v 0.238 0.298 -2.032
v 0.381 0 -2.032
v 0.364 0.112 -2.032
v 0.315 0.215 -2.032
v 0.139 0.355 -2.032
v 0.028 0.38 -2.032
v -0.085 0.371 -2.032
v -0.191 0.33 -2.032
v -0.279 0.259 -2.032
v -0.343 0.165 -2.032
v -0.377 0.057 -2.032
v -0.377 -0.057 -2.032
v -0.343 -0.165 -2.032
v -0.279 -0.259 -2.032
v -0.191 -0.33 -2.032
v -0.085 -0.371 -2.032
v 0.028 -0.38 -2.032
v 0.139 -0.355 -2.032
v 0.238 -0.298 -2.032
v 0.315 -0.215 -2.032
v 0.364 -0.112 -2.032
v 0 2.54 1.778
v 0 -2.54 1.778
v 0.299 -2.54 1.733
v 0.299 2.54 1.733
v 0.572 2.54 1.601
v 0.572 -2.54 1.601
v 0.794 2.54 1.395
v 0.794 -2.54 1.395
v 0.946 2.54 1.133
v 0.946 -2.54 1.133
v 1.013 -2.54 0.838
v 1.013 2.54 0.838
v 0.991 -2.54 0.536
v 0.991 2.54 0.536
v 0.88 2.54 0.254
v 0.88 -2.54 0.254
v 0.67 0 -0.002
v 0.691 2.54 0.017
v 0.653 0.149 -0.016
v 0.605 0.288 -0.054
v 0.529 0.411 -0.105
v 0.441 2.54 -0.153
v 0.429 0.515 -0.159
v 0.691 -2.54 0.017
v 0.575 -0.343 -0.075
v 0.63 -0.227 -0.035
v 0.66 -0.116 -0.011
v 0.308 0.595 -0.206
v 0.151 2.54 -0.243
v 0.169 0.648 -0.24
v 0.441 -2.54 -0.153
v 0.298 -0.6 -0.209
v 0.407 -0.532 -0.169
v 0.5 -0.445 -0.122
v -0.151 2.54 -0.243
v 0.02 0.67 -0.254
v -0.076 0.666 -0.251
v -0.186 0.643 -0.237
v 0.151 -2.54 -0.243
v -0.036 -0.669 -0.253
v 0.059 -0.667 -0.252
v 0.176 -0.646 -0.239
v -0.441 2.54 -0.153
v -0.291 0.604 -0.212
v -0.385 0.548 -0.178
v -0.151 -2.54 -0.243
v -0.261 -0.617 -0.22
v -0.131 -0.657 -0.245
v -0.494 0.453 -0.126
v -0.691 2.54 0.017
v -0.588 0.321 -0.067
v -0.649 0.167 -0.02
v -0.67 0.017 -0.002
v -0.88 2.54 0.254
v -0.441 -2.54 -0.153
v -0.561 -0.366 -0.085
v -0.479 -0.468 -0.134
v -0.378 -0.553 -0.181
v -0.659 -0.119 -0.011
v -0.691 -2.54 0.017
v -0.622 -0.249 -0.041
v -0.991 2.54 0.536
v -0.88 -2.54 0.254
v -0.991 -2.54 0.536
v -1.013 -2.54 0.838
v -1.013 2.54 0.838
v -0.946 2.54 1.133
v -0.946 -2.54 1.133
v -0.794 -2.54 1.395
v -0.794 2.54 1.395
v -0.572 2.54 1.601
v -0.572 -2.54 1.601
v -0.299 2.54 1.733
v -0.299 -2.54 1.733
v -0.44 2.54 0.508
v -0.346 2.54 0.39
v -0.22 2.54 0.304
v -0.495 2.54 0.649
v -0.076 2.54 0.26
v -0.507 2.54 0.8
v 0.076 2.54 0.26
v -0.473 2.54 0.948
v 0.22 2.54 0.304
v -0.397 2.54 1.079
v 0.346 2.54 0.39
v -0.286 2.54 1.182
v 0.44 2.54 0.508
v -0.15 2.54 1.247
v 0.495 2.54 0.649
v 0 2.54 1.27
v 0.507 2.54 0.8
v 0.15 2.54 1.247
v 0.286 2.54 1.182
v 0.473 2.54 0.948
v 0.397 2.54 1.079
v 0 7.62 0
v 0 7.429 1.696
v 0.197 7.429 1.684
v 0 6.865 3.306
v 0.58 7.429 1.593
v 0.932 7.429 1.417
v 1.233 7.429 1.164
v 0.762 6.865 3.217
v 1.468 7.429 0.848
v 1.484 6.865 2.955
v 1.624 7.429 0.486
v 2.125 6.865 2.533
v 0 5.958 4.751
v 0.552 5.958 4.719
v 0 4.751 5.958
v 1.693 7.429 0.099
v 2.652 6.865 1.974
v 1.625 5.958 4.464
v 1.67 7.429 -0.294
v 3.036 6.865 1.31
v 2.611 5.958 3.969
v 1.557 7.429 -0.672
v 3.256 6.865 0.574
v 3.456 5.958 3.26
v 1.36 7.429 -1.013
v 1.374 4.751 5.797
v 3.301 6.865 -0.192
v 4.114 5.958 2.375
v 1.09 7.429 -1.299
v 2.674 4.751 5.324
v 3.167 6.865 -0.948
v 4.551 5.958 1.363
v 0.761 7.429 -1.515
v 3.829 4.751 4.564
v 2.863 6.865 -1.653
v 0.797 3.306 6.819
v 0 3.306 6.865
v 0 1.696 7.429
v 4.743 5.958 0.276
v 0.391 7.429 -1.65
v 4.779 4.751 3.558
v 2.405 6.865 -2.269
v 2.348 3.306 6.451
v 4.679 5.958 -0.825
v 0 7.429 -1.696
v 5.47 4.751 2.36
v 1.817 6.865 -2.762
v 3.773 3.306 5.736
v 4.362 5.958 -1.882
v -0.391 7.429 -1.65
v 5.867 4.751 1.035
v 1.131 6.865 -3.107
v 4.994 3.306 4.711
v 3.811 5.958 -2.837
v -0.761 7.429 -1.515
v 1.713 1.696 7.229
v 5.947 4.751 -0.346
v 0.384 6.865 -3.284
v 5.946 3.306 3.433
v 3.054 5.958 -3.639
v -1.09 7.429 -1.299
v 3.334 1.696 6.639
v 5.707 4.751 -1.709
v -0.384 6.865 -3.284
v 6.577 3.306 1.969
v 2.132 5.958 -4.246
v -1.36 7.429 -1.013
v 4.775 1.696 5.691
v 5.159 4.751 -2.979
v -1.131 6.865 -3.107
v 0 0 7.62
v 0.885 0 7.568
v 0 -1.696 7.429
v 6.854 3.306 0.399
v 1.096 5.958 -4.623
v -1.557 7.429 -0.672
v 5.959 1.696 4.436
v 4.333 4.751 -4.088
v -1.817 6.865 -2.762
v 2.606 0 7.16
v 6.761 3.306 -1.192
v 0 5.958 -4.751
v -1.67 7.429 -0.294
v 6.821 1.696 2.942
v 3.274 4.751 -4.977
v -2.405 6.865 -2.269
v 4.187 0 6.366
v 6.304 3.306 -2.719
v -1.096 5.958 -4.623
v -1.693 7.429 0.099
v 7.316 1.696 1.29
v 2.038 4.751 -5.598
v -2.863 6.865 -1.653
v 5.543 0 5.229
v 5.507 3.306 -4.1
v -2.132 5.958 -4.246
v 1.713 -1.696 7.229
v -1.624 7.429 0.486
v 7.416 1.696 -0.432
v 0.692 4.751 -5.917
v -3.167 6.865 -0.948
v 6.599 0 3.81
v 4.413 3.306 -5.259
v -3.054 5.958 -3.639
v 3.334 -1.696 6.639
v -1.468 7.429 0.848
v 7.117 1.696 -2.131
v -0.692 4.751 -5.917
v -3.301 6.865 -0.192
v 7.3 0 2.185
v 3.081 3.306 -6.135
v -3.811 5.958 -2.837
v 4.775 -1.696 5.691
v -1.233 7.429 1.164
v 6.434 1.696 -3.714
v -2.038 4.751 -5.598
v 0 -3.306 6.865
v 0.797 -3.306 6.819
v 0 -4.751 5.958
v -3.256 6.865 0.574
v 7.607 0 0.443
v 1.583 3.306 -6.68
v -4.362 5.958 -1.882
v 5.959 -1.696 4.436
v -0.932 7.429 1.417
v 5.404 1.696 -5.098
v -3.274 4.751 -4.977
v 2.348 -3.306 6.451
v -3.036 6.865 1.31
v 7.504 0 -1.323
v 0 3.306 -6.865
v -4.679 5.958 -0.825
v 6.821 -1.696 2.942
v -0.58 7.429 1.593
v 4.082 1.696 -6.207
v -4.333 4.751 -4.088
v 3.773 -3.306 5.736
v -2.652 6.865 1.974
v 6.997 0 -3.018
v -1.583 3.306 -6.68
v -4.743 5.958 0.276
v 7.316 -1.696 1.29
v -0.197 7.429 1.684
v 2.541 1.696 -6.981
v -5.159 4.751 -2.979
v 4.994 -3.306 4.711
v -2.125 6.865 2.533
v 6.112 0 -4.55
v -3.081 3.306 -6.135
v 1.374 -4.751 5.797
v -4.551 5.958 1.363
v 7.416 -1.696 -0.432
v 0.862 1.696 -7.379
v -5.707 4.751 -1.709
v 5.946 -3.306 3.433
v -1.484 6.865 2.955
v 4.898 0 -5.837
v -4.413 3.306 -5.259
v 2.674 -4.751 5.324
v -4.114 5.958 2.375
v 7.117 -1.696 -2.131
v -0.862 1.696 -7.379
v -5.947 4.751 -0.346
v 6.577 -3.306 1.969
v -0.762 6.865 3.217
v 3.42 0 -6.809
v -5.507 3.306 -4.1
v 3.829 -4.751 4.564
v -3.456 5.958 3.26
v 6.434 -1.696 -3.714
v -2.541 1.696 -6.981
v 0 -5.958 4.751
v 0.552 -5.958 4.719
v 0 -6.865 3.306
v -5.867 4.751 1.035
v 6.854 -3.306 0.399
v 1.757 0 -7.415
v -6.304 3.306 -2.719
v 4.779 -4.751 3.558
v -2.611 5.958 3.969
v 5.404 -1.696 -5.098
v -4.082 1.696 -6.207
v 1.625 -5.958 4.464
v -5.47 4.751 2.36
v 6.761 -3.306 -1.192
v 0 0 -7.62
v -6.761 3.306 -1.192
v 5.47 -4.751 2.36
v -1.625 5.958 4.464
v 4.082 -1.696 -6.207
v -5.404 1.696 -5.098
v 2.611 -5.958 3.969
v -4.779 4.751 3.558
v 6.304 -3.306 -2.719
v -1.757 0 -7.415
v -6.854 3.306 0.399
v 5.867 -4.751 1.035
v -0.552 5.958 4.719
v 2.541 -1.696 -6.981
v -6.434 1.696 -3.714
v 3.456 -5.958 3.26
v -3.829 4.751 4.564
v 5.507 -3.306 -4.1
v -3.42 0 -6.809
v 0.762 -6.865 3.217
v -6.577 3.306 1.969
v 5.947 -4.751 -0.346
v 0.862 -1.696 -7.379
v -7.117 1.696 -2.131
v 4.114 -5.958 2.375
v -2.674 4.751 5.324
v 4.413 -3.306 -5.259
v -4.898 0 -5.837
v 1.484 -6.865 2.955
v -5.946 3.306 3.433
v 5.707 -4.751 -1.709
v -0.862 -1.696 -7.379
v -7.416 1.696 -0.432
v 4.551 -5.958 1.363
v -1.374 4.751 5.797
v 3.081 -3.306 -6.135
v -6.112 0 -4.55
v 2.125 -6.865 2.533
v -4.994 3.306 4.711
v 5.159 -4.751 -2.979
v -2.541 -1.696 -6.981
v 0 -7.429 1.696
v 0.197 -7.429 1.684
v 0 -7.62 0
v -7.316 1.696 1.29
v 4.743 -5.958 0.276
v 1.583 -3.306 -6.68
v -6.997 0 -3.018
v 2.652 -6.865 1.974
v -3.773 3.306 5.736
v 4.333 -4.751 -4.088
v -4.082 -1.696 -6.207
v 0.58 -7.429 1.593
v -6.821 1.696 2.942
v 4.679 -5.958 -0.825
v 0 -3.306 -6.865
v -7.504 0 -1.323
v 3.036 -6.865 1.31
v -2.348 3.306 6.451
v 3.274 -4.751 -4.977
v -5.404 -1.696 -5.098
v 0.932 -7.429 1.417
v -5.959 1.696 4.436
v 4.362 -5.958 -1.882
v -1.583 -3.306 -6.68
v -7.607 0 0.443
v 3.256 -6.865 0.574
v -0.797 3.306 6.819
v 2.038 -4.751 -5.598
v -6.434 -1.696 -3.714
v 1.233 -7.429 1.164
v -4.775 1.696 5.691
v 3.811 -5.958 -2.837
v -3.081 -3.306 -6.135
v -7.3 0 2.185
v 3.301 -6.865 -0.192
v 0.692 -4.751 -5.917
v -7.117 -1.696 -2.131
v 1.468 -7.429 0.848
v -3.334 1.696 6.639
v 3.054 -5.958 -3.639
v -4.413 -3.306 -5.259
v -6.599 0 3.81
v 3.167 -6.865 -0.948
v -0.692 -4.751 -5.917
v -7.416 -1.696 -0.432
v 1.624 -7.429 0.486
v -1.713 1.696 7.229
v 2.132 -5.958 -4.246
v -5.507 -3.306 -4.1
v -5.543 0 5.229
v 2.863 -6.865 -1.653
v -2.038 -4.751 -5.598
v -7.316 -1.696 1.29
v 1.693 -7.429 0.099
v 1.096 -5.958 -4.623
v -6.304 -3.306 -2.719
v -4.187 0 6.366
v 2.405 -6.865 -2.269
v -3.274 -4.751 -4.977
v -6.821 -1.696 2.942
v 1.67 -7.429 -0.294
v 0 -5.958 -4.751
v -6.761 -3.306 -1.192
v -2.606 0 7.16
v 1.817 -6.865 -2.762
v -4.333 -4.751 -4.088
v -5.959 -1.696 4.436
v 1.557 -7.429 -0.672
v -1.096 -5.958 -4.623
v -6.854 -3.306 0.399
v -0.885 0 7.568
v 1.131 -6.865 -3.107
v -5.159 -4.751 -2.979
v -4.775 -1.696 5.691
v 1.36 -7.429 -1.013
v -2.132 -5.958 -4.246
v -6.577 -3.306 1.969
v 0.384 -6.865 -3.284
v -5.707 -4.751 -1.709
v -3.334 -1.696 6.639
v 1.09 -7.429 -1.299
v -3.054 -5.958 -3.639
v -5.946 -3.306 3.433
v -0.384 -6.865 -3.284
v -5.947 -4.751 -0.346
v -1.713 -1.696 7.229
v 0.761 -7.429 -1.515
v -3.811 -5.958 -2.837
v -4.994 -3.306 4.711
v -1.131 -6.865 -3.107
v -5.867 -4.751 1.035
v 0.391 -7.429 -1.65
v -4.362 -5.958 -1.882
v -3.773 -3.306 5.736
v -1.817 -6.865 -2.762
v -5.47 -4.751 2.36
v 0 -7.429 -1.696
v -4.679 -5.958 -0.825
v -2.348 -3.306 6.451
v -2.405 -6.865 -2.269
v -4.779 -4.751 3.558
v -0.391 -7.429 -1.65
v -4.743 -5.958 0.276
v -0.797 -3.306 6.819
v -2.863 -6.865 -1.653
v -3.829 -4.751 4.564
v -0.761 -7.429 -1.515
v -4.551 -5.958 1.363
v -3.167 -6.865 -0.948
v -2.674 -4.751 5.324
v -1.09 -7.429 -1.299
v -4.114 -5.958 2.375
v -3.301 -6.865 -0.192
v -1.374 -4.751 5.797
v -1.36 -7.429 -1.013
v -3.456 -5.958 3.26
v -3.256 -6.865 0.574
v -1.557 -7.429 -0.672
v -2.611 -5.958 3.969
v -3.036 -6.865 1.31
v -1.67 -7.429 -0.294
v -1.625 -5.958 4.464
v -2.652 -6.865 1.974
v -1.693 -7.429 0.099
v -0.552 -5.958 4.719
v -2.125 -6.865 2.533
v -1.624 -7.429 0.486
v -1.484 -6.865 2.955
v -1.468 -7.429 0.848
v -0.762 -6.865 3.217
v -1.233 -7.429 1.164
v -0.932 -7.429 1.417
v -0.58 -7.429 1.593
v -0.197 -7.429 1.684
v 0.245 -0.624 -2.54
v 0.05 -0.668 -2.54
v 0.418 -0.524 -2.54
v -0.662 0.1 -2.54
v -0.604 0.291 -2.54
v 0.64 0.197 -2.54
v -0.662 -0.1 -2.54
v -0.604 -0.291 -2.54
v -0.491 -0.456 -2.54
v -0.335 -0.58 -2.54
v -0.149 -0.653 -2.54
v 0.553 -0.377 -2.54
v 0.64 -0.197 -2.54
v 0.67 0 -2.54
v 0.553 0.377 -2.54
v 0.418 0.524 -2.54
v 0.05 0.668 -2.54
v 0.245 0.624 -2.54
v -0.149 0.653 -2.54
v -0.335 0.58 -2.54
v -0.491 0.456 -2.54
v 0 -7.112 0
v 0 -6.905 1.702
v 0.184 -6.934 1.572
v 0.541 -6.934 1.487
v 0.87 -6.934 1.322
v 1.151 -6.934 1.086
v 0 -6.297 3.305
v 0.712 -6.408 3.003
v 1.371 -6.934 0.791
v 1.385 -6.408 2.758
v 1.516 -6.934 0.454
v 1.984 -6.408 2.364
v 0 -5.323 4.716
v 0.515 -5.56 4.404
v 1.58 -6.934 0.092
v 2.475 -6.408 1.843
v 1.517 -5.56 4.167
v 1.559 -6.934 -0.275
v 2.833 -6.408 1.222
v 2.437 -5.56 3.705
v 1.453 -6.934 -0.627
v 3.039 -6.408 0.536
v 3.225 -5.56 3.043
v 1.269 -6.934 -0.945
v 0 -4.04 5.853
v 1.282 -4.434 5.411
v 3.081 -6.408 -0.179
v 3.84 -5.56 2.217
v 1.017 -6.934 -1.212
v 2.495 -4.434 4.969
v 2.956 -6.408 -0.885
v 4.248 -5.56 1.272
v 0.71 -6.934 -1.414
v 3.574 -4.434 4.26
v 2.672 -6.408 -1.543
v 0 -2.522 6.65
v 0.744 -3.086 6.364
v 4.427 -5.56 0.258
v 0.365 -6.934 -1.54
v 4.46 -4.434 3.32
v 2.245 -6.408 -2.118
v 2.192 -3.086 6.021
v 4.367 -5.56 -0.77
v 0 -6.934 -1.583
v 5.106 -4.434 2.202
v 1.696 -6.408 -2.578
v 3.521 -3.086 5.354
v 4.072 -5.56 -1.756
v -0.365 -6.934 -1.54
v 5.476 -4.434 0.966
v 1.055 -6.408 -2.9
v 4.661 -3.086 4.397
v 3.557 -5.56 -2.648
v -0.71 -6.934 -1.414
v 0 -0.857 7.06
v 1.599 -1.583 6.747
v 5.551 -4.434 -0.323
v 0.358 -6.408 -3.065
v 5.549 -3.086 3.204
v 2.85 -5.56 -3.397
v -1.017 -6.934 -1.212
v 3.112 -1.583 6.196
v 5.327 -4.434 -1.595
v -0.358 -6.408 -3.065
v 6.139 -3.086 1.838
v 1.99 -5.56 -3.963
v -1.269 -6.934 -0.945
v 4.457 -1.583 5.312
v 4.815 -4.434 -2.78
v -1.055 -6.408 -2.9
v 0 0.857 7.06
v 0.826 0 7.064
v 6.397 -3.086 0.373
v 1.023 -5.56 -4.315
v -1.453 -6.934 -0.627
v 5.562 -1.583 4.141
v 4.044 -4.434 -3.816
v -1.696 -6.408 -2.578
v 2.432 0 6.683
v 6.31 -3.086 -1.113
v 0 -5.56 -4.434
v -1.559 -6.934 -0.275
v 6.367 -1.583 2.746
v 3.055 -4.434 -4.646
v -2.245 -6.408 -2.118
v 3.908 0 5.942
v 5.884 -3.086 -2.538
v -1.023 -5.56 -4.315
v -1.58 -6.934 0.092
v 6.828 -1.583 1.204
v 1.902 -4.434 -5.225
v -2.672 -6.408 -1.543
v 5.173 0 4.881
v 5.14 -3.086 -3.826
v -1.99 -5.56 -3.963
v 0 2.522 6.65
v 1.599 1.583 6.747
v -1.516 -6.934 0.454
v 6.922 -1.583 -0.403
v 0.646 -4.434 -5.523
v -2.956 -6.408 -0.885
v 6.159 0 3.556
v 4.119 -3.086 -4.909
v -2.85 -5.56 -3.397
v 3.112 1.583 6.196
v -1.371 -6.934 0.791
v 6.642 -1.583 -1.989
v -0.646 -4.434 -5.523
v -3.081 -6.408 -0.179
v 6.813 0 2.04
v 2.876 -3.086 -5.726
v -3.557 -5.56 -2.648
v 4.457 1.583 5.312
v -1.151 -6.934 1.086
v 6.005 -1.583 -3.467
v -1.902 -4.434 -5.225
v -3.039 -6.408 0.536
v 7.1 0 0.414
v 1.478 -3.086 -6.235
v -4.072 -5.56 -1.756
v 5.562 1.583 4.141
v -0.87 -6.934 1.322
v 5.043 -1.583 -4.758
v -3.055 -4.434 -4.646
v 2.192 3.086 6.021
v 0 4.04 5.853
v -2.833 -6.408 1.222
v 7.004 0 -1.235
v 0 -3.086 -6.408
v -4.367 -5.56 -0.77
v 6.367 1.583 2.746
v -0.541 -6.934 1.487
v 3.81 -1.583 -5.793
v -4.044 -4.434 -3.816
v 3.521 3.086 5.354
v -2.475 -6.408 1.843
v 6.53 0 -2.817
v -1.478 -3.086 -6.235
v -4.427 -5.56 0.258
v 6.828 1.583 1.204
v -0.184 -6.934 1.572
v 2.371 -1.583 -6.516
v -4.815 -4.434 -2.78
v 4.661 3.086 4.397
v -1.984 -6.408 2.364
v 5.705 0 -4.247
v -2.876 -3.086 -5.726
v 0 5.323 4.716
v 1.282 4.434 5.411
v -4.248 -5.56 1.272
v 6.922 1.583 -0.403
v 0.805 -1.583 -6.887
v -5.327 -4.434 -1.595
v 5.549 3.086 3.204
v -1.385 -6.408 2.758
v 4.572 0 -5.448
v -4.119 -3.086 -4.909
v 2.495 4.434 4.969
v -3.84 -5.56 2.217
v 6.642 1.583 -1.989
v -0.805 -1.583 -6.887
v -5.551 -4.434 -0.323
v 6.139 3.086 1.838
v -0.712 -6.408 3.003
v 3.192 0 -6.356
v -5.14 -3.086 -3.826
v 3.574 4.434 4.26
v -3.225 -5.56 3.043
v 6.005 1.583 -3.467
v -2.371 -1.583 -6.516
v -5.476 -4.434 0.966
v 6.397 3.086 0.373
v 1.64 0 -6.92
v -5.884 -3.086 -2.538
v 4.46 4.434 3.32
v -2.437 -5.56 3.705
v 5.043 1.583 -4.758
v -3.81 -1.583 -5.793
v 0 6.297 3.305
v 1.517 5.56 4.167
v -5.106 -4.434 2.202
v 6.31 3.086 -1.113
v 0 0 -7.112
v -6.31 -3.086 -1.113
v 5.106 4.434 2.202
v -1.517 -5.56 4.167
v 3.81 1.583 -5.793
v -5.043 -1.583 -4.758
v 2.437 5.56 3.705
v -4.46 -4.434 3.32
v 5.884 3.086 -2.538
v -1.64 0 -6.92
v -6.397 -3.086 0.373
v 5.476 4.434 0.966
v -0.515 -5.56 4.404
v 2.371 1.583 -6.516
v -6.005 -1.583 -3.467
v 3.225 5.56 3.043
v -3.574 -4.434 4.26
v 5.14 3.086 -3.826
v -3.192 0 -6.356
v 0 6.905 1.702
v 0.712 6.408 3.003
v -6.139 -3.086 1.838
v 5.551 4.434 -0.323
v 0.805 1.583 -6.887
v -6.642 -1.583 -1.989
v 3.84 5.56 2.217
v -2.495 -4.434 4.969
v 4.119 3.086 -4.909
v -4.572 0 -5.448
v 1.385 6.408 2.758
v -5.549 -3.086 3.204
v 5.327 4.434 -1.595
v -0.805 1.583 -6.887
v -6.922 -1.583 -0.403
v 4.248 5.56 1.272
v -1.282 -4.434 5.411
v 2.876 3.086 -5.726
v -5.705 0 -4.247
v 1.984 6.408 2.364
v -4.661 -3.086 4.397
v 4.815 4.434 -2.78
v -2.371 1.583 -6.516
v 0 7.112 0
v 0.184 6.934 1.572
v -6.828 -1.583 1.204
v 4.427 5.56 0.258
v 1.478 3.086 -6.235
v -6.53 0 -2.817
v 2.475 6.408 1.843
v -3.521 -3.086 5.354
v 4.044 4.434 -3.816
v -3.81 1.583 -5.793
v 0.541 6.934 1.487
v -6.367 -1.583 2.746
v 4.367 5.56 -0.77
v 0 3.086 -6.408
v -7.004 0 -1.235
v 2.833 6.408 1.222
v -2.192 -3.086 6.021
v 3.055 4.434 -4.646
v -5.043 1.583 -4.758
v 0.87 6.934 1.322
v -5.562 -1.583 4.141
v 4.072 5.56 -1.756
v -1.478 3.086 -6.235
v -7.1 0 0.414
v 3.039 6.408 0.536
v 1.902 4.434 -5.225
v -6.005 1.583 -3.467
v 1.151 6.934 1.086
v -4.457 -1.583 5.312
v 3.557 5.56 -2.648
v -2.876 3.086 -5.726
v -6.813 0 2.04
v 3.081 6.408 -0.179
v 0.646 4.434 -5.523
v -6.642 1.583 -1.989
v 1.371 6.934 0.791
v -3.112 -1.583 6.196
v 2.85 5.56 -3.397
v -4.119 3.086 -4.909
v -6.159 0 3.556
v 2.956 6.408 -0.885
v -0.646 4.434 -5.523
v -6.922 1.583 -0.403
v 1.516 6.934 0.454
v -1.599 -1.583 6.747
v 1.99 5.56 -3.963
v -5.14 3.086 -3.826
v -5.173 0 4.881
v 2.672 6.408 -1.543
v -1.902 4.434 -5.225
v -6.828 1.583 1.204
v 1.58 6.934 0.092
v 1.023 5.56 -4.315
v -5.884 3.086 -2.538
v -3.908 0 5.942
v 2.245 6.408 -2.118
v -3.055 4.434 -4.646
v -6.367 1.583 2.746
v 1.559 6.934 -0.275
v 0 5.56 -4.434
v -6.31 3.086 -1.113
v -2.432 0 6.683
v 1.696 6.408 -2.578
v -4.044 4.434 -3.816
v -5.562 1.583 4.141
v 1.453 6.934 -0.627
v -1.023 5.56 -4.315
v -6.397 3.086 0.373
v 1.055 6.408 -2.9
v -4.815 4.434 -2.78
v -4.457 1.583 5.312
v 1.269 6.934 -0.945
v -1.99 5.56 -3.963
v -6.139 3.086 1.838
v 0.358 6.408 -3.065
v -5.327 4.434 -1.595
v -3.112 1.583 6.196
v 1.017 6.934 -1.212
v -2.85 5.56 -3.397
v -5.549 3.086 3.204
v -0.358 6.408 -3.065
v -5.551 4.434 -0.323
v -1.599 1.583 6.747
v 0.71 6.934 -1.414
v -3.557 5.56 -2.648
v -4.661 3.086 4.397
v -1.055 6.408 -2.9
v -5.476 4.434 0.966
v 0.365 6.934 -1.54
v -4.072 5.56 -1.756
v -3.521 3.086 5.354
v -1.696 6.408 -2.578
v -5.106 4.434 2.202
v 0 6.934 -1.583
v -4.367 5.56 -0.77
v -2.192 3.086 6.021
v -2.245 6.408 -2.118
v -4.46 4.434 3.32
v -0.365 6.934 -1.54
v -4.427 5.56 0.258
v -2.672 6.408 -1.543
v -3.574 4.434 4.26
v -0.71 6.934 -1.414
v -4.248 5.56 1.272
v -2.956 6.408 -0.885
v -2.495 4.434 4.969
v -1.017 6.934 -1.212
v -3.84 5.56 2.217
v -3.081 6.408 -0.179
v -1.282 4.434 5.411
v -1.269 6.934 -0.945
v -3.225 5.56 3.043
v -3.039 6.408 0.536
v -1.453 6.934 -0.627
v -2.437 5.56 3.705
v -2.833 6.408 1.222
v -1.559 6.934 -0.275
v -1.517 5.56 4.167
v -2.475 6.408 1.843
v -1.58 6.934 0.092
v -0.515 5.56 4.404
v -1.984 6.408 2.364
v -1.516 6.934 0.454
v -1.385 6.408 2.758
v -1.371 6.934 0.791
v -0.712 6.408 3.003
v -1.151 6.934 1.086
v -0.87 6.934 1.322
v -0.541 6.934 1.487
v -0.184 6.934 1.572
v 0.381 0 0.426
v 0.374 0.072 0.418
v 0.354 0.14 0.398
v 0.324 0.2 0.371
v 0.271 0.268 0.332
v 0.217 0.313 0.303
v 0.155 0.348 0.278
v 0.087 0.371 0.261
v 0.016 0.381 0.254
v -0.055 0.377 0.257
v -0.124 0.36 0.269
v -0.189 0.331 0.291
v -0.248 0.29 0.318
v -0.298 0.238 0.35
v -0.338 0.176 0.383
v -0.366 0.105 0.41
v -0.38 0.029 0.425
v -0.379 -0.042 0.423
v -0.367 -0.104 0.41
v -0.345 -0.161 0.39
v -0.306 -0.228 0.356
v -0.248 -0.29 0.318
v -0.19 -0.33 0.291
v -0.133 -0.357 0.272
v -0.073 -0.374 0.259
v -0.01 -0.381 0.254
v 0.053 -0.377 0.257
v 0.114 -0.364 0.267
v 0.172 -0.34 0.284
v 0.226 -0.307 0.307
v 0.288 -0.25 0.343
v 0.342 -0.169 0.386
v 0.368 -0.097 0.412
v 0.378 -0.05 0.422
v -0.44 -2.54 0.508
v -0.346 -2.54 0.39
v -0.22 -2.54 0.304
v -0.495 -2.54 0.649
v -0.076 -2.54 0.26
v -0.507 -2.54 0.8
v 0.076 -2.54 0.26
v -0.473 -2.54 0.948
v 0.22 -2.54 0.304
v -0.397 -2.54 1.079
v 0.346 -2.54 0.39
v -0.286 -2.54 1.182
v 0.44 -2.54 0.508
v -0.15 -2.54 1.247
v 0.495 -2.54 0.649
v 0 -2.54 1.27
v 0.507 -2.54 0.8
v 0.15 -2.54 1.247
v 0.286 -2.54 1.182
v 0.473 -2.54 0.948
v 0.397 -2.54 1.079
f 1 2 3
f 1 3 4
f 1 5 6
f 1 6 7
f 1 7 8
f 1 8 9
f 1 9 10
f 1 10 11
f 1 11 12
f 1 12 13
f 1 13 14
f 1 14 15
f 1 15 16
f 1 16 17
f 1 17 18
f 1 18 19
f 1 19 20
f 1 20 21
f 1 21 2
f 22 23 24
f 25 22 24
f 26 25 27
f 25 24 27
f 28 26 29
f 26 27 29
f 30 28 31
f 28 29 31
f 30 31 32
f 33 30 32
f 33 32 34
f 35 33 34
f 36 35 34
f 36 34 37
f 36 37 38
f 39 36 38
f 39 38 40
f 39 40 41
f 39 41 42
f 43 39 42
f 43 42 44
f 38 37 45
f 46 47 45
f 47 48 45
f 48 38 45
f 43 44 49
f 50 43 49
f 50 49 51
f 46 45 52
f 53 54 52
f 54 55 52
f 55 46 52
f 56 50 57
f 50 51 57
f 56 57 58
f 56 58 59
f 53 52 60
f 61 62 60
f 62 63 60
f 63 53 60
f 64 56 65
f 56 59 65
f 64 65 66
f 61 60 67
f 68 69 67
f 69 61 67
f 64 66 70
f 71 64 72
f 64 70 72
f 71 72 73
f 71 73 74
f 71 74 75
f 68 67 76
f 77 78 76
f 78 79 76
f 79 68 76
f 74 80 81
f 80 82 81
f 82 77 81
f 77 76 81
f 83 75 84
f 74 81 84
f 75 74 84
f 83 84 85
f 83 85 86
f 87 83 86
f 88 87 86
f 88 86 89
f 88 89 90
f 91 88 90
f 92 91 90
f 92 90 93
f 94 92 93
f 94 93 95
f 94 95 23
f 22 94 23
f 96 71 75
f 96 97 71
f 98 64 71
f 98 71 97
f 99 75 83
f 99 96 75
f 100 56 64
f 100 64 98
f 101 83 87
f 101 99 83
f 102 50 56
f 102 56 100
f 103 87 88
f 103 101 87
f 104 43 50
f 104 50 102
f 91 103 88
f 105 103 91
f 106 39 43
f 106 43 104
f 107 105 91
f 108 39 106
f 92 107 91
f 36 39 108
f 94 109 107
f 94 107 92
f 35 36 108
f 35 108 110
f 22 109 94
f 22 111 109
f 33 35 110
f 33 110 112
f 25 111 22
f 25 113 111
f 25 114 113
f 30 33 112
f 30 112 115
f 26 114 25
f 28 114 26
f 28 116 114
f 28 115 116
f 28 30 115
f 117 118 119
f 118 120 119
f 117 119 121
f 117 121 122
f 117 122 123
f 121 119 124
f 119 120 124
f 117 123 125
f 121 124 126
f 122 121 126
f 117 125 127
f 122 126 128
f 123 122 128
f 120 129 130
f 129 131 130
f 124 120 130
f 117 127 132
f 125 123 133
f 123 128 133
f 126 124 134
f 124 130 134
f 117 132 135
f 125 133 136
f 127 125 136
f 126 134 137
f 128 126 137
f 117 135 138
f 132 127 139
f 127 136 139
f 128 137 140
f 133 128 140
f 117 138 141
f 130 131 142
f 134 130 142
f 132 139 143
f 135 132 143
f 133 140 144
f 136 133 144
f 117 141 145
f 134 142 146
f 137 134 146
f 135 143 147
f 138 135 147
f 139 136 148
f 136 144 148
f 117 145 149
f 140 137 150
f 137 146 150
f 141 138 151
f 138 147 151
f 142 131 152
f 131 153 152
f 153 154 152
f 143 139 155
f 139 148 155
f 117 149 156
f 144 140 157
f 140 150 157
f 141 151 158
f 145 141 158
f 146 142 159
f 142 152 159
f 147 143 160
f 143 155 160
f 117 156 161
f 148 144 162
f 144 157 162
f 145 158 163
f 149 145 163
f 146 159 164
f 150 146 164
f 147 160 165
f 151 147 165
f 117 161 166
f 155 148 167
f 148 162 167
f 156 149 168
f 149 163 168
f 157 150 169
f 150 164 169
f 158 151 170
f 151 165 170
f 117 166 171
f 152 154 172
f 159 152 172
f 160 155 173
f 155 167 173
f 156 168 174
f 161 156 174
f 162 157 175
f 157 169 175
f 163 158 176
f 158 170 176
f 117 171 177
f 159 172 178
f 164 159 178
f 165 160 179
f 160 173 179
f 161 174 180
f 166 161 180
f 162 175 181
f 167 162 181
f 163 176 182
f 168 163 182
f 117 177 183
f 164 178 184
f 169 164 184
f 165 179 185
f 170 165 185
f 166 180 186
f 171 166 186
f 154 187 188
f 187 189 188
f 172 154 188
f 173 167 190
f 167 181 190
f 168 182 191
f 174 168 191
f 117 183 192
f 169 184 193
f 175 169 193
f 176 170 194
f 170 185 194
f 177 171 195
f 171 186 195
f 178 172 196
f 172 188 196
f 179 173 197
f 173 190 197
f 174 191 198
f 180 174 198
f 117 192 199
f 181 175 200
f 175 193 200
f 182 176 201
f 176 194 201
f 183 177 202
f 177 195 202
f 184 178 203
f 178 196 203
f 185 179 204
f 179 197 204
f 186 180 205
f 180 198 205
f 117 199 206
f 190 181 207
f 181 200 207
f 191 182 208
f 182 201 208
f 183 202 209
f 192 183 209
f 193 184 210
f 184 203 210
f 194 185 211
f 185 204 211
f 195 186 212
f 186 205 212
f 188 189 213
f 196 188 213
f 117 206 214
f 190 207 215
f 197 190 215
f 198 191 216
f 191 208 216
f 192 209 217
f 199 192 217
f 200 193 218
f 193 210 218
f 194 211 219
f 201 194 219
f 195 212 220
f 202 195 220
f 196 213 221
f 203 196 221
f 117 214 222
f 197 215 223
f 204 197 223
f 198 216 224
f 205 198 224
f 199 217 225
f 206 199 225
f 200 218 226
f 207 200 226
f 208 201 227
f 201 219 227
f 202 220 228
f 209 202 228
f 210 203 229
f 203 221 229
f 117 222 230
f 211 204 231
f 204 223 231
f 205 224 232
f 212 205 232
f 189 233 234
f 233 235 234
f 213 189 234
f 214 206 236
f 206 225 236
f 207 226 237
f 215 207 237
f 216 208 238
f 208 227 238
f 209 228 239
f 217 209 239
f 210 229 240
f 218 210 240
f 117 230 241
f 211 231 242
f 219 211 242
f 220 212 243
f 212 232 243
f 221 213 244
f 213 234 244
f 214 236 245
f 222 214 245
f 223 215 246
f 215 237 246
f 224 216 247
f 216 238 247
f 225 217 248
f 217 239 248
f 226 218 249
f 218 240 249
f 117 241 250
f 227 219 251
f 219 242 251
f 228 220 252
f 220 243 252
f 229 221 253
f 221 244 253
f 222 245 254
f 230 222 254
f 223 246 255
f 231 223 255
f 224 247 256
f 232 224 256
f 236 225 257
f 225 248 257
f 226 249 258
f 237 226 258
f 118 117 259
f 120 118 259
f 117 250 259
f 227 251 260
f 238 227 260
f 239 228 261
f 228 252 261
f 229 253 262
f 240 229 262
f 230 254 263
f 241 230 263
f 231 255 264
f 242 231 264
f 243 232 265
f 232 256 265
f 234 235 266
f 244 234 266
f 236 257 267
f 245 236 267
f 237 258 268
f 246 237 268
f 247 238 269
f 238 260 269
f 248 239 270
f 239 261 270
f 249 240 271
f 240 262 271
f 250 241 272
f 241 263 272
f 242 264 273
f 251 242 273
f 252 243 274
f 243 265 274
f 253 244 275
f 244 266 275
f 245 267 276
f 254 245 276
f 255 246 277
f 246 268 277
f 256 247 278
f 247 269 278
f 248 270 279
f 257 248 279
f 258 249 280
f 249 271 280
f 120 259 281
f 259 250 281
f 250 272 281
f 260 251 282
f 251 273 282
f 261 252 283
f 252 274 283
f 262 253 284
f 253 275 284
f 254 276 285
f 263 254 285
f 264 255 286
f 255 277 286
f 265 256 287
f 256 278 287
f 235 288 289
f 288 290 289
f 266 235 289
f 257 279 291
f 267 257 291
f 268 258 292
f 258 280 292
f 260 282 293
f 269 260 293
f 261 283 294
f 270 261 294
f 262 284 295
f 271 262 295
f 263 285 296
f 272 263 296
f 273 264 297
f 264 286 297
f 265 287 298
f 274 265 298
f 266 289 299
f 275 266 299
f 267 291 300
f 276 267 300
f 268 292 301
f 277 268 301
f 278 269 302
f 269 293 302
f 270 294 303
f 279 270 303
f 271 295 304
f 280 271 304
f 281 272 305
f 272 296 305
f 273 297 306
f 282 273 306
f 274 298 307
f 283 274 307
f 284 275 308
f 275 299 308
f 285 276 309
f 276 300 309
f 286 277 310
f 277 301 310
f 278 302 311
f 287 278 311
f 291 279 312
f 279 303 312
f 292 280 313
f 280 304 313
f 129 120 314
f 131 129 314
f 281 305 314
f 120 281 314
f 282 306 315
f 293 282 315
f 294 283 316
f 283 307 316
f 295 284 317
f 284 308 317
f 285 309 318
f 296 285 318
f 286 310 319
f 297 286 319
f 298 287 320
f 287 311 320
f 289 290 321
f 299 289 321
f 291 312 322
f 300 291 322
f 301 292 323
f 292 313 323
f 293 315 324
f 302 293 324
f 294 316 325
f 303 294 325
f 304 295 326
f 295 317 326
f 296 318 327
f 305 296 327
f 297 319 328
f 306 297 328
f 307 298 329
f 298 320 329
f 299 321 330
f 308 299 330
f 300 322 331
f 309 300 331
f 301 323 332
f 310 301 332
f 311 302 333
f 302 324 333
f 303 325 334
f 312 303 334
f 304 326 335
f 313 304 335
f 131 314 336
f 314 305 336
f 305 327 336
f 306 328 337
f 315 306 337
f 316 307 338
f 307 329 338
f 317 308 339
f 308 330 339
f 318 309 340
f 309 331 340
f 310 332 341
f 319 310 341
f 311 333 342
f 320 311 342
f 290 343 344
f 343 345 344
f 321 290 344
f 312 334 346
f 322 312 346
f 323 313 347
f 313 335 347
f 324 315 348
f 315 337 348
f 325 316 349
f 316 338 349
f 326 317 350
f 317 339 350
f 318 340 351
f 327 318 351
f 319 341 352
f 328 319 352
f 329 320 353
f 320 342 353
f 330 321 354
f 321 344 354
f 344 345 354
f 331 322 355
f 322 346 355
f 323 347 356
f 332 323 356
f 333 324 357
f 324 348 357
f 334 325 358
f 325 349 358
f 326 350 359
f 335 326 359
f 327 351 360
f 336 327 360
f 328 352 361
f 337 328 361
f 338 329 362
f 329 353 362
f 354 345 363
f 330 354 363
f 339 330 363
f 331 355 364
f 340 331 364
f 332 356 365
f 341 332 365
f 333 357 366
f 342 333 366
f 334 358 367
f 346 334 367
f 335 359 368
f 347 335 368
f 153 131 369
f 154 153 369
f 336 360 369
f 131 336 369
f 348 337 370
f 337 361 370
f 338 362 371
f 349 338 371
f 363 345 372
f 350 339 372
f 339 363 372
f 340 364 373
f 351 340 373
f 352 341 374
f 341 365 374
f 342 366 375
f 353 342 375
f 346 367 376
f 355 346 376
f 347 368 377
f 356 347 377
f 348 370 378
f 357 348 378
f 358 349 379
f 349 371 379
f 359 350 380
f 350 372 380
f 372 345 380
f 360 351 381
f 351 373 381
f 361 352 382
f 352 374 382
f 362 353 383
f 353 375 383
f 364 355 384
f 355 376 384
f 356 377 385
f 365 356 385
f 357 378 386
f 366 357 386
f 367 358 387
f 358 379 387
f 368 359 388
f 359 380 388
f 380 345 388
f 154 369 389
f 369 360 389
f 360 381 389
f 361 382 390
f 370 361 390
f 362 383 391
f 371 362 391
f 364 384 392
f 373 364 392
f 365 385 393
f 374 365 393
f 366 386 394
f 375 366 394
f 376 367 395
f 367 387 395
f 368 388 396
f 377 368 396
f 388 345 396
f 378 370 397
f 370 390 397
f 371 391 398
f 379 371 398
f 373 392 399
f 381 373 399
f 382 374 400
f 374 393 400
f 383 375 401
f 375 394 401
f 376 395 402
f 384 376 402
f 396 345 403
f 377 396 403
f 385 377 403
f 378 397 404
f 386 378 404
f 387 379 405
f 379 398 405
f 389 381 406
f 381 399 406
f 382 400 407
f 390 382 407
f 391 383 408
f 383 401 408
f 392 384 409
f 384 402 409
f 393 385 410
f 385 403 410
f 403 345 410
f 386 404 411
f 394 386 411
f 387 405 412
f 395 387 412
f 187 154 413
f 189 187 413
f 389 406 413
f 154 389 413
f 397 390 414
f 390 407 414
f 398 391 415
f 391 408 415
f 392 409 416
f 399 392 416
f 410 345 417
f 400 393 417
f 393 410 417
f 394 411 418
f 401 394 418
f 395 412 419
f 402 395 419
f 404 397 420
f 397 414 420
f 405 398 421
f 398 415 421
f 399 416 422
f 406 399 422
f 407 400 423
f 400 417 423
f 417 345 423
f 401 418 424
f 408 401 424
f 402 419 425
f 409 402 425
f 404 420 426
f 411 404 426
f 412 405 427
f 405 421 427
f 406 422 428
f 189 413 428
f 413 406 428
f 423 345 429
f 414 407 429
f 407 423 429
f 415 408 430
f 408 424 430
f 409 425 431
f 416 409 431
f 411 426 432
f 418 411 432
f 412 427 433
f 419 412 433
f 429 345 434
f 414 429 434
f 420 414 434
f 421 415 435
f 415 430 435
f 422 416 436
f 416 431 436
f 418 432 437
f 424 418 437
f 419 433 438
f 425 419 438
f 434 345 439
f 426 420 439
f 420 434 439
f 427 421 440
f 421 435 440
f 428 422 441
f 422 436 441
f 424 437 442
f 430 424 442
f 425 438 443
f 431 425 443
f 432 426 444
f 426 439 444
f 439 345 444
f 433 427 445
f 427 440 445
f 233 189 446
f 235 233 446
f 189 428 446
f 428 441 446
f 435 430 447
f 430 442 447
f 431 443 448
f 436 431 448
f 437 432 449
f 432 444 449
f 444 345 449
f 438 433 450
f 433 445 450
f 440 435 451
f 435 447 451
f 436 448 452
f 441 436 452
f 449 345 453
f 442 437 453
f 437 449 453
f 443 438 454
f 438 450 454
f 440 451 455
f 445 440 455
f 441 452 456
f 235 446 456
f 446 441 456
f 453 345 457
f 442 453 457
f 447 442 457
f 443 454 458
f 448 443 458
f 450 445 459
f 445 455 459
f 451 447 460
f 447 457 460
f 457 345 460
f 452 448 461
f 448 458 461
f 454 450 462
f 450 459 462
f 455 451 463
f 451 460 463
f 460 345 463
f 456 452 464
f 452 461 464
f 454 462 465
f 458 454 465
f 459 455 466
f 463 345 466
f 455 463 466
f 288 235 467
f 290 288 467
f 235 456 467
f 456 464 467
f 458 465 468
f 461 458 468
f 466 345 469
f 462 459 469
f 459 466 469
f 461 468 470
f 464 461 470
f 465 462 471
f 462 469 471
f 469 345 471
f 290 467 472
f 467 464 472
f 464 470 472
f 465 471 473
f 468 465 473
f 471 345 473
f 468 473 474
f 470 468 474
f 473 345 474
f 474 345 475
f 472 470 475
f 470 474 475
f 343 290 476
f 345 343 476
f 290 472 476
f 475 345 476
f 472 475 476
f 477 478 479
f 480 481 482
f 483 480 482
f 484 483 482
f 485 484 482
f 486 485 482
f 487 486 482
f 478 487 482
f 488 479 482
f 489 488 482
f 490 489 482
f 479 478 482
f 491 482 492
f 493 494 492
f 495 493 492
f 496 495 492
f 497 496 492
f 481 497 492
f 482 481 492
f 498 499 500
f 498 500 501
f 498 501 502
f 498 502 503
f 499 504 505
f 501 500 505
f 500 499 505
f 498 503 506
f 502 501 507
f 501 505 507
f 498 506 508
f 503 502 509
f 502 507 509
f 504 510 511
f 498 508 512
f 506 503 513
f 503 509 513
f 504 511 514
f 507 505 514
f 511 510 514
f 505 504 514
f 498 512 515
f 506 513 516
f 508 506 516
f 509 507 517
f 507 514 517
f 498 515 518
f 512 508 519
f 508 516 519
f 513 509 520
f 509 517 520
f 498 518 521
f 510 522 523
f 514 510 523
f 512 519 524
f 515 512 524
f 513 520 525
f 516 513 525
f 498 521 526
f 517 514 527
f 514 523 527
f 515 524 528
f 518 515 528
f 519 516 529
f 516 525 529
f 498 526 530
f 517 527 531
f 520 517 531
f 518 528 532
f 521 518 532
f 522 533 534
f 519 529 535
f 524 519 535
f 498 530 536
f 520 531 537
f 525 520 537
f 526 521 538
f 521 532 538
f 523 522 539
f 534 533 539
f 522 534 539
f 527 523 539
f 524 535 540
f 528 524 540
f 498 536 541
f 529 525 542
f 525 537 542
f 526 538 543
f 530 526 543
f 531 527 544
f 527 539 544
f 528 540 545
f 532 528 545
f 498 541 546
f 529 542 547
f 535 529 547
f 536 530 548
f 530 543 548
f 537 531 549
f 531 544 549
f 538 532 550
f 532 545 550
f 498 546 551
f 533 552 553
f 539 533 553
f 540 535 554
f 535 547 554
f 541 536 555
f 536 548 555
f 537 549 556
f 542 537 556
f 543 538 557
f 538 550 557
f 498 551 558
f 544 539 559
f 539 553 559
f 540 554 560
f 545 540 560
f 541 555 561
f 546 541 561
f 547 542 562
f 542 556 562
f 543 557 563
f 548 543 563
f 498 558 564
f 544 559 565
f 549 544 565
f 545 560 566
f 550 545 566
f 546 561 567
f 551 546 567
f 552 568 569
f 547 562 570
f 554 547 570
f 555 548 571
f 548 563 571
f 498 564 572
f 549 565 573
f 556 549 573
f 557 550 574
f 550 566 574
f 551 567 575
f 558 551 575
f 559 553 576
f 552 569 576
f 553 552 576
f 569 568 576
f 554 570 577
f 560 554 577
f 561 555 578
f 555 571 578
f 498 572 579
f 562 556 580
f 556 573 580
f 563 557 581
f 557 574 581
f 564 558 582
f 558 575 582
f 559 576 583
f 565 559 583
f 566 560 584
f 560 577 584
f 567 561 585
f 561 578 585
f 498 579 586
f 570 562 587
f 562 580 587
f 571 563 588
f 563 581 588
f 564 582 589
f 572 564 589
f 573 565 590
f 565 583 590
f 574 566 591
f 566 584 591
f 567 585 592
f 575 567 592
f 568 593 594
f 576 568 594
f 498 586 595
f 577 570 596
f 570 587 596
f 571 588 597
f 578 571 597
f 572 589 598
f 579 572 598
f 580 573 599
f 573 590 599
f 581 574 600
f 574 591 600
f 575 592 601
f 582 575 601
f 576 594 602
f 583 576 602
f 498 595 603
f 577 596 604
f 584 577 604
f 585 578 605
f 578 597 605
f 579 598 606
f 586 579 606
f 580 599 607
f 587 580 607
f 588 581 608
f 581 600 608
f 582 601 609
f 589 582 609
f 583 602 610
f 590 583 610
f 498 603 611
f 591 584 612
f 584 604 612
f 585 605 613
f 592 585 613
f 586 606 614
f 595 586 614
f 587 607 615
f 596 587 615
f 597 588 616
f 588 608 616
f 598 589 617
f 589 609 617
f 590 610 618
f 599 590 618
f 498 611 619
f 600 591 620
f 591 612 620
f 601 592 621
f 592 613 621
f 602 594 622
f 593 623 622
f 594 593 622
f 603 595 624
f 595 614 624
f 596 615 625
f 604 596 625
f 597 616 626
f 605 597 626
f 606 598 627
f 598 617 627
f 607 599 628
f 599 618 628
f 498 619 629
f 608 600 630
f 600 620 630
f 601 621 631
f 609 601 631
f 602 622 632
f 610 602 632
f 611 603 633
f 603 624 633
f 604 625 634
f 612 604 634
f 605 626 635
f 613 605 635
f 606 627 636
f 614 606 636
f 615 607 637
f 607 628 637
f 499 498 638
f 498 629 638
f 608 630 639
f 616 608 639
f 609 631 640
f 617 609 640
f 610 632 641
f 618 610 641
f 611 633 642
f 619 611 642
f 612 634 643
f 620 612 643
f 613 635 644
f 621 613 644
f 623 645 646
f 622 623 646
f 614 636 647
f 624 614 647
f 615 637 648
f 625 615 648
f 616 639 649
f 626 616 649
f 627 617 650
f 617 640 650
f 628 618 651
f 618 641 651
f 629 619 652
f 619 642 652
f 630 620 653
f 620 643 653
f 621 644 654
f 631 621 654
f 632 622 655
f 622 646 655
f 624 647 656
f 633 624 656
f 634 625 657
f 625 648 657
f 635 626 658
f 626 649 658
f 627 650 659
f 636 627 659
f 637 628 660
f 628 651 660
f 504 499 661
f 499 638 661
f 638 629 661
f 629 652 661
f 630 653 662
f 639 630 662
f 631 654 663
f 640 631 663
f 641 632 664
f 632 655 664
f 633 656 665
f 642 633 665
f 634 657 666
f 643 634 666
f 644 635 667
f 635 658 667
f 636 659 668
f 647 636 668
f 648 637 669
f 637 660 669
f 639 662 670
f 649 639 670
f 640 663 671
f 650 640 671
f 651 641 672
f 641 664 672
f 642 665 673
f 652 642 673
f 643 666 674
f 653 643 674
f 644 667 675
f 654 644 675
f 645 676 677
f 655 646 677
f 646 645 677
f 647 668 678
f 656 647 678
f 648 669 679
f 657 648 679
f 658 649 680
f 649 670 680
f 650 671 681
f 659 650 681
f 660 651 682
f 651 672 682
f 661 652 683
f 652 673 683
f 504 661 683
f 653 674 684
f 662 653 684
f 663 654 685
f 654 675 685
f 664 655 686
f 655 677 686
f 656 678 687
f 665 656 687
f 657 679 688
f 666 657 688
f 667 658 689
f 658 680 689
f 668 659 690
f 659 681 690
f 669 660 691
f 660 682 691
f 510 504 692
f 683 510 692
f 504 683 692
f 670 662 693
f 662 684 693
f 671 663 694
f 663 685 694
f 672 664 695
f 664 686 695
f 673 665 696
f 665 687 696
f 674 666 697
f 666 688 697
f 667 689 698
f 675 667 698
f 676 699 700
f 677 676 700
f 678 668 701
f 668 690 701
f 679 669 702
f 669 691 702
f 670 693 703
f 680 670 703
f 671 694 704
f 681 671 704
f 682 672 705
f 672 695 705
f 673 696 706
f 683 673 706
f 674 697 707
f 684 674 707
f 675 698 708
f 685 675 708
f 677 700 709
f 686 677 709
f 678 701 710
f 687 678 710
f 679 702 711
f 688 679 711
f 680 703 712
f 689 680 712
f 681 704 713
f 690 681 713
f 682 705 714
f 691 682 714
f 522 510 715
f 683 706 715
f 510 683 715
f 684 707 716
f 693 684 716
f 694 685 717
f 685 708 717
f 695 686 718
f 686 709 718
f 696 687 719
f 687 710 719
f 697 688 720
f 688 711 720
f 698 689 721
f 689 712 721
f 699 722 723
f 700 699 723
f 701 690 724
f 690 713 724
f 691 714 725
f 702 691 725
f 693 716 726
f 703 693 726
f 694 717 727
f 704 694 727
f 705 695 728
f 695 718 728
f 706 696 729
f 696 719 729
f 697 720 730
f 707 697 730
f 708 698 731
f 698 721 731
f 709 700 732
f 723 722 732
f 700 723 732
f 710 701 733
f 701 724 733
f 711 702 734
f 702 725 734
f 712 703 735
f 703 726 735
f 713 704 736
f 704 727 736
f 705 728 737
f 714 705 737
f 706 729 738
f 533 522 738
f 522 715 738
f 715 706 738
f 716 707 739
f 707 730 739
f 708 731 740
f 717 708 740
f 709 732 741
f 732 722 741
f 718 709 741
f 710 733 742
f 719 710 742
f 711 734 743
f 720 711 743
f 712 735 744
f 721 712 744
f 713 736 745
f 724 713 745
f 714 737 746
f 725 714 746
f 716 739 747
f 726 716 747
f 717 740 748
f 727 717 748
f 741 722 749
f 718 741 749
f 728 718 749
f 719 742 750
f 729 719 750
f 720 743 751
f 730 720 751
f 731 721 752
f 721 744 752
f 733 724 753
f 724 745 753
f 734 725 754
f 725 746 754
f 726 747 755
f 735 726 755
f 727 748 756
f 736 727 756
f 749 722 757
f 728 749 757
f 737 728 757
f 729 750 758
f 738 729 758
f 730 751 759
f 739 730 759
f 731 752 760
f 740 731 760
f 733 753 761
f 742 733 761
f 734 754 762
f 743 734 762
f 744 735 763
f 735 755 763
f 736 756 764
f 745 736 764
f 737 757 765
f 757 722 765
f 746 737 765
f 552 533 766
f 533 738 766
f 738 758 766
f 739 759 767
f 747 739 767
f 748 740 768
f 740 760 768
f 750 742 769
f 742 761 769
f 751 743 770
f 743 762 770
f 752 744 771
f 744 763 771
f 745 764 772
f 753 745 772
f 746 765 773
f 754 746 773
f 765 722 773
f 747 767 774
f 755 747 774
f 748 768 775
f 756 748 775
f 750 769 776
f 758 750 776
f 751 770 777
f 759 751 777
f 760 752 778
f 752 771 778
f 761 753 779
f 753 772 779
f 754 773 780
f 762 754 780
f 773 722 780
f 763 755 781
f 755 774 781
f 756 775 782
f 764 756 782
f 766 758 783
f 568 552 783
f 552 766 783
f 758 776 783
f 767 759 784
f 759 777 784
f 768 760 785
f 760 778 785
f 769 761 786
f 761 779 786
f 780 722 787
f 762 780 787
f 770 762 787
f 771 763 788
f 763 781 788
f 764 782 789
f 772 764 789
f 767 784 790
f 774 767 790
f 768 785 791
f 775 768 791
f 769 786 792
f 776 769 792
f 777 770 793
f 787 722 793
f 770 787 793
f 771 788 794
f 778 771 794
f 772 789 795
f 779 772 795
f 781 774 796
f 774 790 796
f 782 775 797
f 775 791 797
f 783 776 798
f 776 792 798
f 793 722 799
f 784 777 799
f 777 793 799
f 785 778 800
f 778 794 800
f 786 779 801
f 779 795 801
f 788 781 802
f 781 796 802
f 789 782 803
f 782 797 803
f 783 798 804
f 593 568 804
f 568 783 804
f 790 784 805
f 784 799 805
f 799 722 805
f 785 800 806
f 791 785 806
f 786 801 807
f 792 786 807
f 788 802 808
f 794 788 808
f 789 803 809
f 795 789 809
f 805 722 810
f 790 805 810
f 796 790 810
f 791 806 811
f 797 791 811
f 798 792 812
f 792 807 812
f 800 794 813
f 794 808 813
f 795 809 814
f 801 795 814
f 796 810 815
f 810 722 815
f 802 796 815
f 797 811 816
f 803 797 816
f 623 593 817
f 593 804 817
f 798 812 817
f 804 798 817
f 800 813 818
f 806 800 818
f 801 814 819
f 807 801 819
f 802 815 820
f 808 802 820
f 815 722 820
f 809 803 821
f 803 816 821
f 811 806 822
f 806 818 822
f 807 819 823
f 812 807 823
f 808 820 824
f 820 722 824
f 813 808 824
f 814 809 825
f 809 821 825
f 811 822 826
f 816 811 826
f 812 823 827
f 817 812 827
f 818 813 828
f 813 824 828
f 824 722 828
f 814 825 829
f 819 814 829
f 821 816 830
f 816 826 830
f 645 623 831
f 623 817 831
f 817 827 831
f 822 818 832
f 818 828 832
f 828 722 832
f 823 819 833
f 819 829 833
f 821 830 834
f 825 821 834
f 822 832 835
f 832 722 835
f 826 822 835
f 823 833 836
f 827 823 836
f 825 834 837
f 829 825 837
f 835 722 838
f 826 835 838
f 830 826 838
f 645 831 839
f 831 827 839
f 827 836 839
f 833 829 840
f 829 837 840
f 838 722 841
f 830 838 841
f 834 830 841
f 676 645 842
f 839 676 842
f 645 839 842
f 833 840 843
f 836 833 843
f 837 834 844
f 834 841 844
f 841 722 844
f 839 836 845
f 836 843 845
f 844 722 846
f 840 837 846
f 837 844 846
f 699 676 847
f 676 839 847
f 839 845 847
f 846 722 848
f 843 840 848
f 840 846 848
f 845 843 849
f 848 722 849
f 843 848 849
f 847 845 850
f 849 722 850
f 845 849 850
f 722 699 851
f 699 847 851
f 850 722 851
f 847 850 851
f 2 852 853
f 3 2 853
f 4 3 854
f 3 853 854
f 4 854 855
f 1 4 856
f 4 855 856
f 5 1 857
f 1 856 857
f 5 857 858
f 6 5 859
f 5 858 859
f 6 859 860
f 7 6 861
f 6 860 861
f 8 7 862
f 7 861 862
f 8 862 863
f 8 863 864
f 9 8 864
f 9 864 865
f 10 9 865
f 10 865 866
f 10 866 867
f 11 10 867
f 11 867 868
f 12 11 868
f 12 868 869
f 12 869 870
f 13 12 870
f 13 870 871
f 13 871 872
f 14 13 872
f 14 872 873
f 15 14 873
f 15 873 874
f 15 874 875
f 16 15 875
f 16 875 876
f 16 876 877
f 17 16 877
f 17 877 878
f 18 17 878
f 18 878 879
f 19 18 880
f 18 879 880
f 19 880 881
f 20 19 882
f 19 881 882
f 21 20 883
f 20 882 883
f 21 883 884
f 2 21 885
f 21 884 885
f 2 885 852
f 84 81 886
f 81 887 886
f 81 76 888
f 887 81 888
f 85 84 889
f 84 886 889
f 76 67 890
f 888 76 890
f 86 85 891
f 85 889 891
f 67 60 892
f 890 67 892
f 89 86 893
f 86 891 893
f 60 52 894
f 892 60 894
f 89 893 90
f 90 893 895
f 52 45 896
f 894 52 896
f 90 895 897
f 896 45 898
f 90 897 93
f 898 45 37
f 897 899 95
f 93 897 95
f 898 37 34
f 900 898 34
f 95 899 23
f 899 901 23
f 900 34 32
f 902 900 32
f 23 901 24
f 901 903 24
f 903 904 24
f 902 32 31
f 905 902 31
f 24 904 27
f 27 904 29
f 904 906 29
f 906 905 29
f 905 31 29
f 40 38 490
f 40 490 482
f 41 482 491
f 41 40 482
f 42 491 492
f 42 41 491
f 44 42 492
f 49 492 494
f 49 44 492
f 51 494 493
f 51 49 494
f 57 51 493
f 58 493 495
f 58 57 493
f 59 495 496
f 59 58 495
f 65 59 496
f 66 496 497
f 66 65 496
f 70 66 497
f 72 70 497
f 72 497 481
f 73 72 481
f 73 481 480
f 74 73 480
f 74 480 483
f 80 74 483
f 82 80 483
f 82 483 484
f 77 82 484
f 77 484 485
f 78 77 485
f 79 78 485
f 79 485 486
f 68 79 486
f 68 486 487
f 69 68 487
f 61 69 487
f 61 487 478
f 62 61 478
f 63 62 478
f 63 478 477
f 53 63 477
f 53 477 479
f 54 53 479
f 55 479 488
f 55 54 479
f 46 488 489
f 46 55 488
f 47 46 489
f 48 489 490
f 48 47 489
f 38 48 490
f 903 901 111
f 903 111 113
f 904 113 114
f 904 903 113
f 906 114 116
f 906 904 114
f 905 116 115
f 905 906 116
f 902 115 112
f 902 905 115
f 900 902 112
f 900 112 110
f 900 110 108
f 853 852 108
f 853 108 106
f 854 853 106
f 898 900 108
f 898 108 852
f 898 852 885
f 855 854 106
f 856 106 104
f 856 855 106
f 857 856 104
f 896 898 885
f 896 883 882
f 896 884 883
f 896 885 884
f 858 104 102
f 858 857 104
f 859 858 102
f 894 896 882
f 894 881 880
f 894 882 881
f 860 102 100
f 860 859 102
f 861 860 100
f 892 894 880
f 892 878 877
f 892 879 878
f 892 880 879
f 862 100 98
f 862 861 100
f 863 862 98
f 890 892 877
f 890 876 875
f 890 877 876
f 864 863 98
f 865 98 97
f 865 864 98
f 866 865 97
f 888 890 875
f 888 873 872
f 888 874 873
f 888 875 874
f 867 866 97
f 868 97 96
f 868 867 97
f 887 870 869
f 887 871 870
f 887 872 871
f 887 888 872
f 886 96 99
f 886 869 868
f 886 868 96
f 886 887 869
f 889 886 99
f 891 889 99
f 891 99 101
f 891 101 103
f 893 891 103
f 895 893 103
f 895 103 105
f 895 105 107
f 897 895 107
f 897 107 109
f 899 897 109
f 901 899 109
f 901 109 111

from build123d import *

# Parameters (mm, degrees)
SKETCH1_R                = 0.508
SKETCH1_R_2              = 0.381
BOSS_EXTRUDE1_DEPTH      = 0.127
SKETCH1_4_R              = 0.669887952
BOSS_EXTRUDE3_DEPTH      = 2.54
BOSS_EXTRUDE4_DEPTH      = 2.54
BOSS_EXTRUDE4_DEPTH_BACK = 2.54
SKETCH2_R                = 1.016
SKETCH2_R_2              = 0.508
CUT_EXTRUDE6_START       = 0.5334
SKETCH1_9_R              = 0.381
CUT_EXTRUDE6_DEPTH       = 2.54
SKETCH1_12_R             = 0.381
CUT_EXTRUDE8_DEPTH       = 2.032


with BuildPart() as part:
    # Sketch1 → Boss-Extrude1 (new body)
    with BuildSketch(Plane.XY):
        Circle(SKETCH1_R)
        Circle(SKETCH1_R_2, mode=Mode.SUBTRACT)
    extrude(amount=BOSS_EXTRUDE1_DEPTH)

    # Sketch1<4> → Boss-Extrude3 (add)
    with BuildSketch(Plane.XY):
        Circle(SKETCH1_4_R)
    extrude(amount=-BOSS_EXTRUDE3_DEPTH)

    # Sketch2 → Boss-Extrude4 (add, two sides: drawn at the far end of the back side and taken through both)
    with BuildSketch(Plane(origin=(0, 0, 0), x_dir=(1, 0, 0), z_dir=(0, 1, 0)).offset(-BOSS_EXTRUDE4_DEPTH_BACK)):
        with Locations((0, -0.762)):
            Circle(SKETCH2_R)
        with Locations((0, -0.762)):
            Circle(SKETCH2_R_2, mode=Mode.SUBTRACT)
    extrude(amount=BOSS_EXTRUDE4_DEPTH + BOSS_EXTRUDE4_DEPTH_BACK)

    # Sketch1<9> → Cut-Extrude6 (cut)
    with BuildSketch(Plane.XY.offset(CUT_EXTRUDE6_START)):
        Circle(SKETCH1_9_R)
    extrude(amount=-CUT_EXTRUDE6_DEPTH, mode=Mode.SUBTRACT)

    # Sketch1<12> → Cut-Extrude8 (cut)
    with BuildSketch(Plane.XY):
        Circle(SKETCH1_12_R)
    extrude(amount=-CUT_EXTRUDE8_DEPTH, mode=Mode.SUBTRACT)


with BuildPart() as body_2:
    # Sketch4 → Revolve1 (revolve)
    with BuildSketch(Plane(origin=(0, 0, 0), x_dir=(0, 0, -1), z_dir=(1, 0, 0))):
        with BuildLine():
            ThreePointArc((0, 7.62), (-7.62, 0), (0, -7.62))
            Line((0, -7.62), (0, -7.112))
            ThreePointArc((0, -7.112), (-7.112, 0), (0, 7.112))
            Line((0, 7.112), (0, 7.62))
        make_face()
    revolve(axis=Axis((0, -7.62, 0), (0, 1, 0)))


solid = Compound([part.part, body_2.part])
